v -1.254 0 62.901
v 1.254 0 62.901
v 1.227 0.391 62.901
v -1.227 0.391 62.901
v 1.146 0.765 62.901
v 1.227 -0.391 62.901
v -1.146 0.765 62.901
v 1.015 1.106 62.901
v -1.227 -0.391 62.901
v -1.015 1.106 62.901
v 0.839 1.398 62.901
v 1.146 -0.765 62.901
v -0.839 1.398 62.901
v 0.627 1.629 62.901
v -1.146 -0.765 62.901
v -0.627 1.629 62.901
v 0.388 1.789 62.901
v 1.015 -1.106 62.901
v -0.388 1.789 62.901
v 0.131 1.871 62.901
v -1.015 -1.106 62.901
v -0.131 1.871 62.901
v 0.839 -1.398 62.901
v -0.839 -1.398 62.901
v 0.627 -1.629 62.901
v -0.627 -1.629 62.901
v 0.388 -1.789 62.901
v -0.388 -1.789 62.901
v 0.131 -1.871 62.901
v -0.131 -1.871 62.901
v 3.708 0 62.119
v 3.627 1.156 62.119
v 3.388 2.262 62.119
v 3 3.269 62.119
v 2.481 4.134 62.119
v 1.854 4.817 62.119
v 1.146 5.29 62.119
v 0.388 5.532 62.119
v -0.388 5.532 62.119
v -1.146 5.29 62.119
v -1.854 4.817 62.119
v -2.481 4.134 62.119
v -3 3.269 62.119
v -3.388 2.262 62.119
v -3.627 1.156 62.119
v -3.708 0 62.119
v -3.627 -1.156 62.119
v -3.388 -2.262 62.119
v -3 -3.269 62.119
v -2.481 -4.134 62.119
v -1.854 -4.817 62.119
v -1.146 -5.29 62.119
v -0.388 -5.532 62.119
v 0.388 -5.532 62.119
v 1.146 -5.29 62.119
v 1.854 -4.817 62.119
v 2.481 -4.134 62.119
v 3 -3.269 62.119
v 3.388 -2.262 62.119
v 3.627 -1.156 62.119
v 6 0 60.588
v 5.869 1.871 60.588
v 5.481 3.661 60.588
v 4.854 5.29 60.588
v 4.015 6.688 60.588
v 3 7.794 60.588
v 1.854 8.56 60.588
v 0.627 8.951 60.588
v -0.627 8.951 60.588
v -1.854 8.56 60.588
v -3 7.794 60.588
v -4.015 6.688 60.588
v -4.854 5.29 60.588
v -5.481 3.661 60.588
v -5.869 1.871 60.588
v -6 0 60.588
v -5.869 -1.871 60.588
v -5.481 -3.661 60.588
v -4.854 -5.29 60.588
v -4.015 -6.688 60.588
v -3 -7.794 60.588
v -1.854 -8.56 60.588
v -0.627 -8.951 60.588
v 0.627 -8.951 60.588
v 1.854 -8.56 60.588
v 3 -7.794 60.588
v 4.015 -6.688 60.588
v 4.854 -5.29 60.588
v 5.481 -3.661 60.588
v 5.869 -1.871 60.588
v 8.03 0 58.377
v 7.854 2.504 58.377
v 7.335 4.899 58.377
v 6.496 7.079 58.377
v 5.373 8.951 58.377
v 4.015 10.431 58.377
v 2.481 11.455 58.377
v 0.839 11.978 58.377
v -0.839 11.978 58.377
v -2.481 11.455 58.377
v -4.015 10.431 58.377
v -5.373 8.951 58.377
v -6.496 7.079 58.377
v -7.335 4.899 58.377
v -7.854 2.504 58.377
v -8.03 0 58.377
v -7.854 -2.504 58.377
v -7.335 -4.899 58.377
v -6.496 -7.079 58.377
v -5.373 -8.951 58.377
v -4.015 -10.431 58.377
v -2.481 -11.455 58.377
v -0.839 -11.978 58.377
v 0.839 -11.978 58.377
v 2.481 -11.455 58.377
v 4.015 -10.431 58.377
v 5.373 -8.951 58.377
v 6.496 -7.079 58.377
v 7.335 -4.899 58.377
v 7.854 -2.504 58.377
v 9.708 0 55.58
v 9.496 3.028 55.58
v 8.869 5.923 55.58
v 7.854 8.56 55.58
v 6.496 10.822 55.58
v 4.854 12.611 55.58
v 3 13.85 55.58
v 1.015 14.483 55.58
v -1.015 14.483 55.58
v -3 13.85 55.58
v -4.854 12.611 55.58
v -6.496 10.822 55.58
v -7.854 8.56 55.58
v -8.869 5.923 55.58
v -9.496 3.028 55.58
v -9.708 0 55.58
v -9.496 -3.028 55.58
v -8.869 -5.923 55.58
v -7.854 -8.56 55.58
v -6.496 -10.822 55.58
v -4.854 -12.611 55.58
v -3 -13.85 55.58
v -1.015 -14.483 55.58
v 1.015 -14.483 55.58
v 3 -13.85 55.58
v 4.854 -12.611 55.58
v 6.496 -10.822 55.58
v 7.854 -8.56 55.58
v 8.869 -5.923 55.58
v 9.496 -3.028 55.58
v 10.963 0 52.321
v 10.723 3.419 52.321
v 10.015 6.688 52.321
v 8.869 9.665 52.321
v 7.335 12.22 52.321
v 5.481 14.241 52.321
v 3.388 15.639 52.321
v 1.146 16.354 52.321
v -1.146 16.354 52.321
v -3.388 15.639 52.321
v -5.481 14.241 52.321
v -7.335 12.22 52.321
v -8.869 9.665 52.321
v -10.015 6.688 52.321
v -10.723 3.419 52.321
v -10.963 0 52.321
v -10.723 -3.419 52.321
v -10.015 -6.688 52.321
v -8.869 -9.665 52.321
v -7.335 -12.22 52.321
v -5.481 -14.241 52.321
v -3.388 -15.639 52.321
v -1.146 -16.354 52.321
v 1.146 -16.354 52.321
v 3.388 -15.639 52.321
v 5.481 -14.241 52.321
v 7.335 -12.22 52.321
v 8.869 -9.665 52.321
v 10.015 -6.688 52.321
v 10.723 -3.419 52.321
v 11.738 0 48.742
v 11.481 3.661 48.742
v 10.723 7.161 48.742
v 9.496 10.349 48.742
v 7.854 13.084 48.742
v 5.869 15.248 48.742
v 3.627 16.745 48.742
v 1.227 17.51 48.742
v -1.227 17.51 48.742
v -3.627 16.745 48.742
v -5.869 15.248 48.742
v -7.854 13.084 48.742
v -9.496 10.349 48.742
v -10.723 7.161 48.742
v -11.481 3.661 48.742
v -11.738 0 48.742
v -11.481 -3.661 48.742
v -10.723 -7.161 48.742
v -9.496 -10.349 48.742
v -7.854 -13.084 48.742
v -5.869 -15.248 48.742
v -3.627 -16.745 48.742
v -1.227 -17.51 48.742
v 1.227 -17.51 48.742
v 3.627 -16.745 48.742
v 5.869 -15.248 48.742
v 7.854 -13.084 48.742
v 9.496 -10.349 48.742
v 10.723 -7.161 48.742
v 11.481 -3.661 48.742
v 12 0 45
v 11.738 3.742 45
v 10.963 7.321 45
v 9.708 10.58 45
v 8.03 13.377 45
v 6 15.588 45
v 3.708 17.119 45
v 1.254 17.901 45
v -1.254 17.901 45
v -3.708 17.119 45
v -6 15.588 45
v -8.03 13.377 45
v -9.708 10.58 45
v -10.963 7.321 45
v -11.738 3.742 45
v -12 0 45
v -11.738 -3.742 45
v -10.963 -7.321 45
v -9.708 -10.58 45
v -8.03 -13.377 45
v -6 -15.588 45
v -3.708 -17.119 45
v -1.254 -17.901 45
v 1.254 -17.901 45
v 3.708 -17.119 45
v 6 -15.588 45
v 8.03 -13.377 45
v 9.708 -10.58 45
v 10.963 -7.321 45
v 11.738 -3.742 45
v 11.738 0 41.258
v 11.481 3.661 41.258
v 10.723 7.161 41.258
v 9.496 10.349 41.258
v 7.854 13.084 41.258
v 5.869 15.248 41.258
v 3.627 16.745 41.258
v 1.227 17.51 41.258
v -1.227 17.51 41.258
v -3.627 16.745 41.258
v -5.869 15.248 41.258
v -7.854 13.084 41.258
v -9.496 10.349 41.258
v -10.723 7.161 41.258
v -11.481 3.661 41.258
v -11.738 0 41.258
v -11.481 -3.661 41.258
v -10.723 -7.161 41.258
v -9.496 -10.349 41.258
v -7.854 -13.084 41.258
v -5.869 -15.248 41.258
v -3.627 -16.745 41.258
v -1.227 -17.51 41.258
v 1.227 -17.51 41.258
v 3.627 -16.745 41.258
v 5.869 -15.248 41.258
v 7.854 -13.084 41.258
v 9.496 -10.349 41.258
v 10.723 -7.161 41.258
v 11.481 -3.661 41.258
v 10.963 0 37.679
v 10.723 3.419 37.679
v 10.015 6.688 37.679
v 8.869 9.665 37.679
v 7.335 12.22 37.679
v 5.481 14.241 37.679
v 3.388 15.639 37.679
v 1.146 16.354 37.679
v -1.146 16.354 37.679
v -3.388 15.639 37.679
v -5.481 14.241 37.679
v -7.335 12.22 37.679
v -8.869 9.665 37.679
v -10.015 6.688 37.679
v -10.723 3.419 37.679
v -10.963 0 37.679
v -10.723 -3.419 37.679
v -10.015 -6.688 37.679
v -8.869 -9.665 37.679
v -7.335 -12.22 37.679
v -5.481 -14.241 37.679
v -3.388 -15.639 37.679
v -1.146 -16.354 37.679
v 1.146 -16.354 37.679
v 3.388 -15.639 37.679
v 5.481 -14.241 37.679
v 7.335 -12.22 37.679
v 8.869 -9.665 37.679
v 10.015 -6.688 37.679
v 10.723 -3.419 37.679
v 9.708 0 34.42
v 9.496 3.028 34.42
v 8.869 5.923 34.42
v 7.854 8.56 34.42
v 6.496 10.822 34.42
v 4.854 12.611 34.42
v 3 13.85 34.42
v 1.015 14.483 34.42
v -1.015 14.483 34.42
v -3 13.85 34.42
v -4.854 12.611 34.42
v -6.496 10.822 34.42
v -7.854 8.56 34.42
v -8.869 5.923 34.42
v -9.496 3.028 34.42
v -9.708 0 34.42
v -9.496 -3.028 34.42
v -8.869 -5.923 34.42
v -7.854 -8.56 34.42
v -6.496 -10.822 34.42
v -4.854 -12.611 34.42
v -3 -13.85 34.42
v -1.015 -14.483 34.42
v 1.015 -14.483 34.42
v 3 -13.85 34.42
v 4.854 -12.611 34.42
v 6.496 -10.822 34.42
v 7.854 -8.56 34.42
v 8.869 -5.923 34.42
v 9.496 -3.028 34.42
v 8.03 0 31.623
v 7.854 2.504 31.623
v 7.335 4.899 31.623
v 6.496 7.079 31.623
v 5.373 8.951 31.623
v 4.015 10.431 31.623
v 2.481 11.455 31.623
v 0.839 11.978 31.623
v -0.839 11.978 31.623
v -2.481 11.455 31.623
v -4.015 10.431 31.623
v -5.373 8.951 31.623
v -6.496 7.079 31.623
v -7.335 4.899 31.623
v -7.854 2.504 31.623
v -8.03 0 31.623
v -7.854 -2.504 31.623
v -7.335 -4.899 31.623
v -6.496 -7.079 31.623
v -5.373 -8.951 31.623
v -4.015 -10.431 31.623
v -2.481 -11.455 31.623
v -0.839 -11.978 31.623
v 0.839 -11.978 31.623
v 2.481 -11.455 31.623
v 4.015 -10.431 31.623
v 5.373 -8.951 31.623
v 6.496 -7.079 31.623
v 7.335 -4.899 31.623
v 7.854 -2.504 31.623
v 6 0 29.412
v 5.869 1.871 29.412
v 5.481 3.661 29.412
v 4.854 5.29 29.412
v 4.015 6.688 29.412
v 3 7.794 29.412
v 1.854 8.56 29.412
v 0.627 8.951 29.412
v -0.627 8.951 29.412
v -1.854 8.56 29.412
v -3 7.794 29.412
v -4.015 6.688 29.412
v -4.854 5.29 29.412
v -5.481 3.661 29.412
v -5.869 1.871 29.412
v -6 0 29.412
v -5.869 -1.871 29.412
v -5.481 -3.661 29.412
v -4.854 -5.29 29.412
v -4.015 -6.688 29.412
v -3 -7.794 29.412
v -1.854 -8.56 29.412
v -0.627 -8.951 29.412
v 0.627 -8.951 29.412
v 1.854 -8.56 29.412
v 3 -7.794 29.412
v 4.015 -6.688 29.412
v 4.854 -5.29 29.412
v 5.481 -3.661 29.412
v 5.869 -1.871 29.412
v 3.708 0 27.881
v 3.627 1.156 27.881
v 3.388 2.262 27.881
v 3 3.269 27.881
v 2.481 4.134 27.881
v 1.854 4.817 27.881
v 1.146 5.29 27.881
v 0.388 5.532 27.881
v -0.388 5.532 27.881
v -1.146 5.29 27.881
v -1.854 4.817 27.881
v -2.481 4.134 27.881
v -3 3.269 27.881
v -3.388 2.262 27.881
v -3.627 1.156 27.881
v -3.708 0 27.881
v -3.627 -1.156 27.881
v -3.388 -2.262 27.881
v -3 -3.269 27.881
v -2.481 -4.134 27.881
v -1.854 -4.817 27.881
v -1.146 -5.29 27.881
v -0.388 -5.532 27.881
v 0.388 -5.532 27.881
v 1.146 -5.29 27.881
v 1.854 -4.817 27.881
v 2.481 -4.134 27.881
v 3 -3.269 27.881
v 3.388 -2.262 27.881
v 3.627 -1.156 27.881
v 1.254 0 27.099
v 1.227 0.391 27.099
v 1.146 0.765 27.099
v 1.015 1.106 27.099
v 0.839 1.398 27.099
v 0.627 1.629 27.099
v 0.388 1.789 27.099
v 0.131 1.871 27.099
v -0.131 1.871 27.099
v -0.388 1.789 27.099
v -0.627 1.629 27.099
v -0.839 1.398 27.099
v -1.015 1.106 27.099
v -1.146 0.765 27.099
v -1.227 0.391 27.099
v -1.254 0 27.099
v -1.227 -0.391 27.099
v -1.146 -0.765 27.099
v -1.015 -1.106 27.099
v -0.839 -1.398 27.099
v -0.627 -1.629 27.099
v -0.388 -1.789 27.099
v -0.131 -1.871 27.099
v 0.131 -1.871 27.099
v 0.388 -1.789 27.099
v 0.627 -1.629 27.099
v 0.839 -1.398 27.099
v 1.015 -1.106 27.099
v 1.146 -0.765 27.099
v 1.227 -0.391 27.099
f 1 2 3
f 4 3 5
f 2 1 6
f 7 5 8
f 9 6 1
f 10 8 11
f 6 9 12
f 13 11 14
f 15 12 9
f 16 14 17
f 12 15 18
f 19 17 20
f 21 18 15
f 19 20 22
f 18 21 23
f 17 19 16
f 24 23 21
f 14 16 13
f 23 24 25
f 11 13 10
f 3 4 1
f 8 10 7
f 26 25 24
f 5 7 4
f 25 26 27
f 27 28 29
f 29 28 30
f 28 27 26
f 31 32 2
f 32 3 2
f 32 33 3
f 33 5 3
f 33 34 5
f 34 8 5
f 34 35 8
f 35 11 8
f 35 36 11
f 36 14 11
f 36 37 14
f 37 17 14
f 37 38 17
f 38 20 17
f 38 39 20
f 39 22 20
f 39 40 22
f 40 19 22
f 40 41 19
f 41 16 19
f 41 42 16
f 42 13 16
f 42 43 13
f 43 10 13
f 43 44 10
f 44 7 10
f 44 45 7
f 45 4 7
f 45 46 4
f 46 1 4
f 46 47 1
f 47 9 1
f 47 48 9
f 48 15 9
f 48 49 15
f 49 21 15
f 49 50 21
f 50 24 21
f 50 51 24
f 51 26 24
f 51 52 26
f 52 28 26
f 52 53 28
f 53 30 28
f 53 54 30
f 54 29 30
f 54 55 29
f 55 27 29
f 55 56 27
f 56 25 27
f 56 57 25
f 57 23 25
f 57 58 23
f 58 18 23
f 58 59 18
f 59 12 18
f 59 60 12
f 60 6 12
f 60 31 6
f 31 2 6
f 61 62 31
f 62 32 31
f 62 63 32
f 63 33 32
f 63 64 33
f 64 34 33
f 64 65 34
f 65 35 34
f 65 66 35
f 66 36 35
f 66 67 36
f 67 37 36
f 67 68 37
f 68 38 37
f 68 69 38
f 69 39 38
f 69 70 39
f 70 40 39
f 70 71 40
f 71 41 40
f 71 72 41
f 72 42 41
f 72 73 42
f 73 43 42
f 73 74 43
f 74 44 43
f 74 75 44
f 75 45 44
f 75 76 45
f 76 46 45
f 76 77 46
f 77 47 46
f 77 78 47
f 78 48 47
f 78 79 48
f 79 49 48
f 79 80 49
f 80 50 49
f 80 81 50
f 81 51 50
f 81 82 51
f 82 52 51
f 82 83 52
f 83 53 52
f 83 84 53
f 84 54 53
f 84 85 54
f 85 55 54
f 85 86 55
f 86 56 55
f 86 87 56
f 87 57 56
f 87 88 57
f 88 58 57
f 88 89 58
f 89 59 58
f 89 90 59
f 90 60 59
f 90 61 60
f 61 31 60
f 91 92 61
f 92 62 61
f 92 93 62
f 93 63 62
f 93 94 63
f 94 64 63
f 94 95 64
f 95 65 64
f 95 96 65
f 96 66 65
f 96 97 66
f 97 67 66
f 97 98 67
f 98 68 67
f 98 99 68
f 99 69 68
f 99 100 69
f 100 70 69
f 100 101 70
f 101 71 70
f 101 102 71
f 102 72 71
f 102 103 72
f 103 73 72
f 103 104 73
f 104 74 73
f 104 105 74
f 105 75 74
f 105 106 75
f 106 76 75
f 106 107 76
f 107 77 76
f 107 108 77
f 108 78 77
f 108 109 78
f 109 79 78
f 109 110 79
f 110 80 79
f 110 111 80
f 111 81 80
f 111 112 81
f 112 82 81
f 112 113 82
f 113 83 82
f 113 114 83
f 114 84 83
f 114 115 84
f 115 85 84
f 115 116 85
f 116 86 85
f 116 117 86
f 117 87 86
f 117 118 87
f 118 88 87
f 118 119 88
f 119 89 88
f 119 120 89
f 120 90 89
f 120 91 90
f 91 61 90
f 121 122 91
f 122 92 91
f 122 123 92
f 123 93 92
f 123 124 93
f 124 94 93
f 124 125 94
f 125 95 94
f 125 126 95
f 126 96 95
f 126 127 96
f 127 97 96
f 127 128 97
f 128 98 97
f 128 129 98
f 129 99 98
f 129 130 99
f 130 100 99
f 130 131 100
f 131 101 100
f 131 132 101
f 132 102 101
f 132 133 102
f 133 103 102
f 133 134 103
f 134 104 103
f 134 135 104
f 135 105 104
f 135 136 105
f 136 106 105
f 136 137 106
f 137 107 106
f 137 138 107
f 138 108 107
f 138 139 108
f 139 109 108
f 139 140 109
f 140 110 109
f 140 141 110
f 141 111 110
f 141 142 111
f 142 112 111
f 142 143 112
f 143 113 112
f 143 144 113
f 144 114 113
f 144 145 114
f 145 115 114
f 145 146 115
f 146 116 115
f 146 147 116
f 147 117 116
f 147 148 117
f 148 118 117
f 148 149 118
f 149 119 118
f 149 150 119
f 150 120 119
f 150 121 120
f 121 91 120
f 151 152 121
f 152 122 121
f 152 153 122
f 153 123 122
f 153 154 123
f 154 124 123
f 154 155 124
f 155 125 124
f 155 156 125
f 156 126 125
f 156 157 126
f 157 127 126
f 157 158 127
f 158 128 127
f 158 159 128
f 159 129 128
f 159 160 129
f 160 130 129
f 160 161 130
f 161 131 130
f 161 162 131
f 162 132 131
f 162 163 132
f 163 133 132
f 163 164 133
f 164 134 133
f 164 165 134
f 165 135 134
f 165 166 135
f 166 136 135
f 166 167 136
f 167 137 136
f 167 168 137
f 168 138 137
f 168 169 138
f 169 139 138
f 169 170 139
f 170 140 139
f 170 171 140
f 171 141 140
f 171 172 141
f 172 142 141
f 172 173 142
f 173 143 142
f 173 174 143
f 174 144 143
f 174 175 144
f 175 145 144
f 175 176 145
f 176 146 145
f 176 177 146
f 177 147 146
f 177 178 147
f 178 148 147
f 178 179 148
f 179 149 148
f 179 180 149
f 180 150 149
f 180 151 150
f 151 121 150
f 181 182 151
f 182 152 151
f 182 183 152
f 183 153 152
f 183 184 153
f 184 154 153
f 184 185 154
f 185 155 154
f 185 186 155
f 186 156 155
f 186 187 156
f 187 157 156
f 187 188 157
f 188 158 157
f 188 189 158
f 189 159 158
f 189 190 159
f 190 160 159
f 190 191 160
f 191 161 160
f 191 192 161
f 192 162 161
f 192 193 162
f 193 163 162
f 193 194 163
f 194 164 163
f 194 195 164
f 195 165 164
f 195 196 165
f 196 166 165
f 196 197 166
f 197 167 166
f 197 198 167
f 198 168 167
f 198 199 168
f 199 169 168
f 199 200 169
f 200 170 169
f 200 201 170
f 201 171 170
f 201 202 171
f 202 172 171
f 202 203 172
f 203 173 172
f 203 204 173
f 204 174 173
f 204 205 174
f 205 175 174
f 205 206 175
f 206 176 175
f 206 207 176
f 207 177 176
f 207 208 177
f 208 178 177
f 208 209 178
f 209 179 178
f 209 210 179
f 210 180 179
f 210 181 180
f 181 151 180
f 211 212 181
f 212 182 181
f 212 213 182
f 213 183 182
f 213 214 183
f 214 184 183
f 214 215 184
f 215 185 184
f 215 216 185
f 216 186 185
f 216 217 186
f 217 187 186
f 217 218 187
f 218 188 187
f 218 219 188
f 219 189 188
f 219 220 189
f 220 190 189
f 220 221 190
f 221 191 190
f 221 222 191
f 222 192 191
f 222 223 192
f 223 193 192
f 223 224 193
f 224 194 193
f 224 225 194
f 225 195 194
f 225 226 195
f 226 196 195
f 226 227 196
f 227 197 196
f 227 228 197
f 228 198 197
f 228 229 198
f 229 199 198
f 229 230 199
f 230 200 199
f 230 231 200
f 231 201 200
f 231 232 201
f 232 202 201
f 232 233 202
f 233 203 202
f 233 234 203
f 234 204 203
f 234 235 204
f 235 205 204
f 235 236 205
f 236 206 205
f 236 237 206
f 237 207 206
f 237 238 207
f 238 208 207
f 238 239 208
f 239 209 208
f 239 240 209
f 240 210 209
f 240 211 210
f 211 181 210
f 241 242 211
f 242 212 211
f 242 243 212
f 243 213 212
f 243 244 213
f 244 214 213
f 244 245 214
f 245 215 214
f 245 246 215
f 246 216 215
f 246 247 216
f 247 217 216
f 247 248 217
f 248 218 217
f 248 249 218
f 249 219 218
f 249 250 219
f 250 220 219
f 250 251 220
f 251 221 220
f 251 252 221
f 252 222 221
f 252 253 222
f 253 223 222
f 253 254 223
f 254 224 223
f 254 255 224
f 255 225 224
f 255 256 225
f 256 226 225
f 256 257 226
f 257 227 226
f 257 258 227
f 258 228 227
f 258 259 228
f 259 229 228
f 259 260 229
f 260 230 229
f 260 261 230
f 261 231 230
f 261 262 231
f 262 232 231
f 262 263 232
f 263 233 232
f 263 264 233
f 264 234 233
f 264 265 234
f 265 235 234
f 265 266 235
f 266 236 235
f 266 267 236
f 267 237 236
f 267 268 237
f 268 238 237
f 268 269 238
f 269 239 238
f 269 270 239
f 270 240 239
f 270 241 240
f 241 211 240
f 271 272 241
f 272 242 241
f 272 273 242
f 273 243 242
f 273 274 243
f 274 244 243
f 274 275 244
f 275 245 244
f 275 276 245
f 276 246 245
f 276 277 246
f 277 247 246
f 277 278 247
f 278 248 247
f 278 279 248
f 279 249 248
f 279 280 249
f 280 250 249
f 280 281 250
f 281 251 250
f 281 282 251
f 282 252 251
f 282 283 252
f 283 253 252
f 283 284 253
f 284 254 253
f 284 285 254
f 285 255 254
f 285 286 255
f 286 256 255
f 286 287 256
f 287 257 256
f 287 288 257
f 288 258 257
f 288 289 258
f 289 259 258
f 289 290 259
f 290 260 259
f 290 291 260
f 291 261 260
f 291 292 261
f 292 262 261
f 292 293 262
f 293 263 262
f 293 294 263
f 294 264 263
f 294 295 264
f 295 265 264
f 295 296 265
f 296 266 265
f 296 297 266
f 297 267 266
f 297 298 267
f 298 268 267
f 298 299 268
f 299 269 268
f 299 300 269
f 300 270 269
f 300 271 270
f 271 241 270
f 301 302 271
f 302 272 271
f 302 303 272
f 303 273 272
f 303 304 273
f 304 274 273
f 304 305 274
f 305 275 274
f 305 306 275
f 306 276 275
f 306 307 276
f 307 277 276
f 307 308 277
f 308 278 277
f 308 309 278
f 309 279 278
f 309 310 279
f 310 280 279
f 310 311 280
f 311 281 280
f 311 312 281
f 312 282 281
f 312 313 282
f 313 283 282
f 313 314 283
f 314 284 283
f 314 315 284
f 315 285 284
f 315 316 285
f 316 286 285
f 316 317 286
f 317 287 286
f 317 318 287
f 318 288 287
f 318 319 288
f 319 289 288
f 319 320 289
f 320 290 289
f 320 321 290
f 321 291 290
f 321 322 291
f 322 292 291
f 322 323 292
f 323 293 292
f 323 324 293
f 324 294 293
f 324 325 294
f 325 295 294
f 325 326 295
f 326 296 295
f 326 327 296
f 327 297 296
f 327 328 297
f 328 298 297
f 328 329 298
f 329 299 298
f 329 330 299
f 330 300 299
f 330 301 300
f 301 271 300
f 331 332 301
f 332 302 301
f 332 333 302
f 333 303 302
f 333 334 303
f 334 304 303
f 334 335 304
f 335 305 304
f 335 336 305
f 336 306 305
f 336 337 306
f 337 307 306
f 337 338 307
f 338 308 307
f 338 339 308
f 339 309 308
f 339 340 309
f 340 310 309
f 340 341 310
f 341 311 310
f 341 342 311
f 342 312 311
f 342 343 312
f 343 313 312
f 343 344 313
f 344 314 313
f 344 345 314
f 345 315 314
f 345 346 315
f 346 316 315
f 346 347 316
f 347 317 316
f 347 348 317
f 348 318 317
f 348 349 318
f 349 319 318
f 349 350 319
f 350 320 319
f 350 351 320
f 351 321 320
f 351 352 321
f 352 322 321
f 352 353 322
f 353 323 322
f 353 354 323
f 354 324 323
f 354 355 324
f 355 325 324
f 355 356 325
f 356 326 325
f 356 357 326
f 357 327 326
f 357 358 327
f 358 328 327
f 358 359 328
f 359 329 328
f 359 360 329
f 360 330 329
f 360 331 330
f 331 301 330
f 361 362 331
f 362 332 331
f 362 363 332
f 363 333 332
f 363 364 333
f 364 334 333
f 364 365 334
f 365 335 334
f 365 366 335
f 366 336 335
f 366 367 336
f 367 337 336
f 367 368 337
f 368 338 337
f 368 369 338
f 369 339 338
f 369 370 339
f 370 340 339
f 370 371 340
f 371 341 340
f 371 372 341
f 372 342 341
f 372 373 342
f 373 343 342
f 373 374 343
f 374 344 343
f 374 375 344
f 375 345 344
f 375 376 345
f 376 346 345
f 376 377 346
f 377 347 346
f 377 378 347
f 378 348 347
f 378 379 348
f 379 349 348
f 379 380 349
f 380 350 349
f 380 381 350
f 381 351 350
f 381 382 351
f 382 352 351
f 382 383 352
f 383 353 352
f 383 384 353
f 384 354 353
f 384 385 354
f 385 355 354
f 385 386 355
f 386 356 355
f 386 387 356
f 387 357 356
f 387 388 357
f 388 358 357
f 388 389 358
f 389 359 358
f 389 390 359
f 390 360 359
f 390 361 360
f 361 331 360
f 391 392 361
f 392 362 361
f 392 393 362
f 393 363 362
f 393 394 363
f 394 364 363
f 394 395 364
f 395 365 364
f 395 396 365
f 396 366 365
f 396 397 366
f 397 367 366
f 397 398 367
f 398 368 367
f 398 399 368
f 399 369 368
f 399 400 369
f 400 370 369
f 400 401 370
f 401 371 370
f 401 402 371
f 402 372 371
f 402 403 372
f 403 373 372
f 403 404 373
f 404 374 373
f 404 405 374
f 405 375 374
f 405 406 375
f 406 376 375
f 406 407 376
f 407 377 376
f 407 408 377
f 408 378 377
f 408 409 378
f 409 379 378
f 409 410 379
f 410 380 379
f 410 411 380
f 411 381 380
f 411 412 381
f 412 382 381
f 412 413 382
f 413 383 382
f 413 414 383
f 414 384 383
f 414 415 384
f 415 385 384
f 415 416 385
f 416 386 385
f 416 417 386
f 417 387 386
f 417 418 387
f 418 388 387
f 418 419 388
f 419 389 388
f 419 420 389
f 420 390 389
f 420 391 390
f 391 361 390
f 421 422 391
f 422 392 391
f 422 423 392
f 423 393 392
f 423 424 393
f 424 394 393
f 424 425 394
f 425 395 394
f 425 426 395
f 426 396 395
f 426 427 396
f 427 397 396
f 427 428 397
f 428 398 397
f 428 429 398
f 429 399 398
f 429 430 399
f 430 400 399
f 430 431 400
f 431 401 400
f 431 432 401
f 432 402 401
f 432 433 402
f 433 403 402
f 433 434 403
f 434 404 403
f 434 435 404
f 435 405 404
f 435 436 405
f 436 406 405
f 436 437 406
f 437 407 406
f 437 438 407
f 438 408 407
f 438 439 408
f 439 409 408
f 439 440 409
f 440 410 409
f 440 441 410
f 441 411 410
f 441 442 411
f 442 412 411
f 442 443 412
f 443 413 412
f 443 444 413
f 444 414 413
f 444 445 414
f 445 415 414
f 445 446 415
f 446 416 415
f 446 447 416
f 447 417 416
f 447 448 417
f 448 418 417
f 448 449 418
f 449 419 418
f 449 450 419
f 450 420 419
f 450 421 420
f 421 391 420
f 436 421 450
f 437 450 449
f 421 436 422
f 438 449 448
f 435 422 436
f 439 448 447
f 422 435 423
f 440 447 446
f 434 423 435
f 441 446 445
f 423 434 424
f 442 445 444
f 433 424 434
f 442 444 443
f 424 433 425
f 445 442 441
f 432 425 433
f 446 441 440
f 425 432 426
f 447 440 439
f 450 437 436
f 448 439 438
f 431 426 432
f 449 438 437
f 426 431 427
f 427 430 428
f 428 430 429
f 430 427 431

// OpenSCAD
// Generated by generate_scads.py
scale([1.0,1.5,1.5]) {
  translate([0,0,30]) {
    sphere(r=12);
  }
}
